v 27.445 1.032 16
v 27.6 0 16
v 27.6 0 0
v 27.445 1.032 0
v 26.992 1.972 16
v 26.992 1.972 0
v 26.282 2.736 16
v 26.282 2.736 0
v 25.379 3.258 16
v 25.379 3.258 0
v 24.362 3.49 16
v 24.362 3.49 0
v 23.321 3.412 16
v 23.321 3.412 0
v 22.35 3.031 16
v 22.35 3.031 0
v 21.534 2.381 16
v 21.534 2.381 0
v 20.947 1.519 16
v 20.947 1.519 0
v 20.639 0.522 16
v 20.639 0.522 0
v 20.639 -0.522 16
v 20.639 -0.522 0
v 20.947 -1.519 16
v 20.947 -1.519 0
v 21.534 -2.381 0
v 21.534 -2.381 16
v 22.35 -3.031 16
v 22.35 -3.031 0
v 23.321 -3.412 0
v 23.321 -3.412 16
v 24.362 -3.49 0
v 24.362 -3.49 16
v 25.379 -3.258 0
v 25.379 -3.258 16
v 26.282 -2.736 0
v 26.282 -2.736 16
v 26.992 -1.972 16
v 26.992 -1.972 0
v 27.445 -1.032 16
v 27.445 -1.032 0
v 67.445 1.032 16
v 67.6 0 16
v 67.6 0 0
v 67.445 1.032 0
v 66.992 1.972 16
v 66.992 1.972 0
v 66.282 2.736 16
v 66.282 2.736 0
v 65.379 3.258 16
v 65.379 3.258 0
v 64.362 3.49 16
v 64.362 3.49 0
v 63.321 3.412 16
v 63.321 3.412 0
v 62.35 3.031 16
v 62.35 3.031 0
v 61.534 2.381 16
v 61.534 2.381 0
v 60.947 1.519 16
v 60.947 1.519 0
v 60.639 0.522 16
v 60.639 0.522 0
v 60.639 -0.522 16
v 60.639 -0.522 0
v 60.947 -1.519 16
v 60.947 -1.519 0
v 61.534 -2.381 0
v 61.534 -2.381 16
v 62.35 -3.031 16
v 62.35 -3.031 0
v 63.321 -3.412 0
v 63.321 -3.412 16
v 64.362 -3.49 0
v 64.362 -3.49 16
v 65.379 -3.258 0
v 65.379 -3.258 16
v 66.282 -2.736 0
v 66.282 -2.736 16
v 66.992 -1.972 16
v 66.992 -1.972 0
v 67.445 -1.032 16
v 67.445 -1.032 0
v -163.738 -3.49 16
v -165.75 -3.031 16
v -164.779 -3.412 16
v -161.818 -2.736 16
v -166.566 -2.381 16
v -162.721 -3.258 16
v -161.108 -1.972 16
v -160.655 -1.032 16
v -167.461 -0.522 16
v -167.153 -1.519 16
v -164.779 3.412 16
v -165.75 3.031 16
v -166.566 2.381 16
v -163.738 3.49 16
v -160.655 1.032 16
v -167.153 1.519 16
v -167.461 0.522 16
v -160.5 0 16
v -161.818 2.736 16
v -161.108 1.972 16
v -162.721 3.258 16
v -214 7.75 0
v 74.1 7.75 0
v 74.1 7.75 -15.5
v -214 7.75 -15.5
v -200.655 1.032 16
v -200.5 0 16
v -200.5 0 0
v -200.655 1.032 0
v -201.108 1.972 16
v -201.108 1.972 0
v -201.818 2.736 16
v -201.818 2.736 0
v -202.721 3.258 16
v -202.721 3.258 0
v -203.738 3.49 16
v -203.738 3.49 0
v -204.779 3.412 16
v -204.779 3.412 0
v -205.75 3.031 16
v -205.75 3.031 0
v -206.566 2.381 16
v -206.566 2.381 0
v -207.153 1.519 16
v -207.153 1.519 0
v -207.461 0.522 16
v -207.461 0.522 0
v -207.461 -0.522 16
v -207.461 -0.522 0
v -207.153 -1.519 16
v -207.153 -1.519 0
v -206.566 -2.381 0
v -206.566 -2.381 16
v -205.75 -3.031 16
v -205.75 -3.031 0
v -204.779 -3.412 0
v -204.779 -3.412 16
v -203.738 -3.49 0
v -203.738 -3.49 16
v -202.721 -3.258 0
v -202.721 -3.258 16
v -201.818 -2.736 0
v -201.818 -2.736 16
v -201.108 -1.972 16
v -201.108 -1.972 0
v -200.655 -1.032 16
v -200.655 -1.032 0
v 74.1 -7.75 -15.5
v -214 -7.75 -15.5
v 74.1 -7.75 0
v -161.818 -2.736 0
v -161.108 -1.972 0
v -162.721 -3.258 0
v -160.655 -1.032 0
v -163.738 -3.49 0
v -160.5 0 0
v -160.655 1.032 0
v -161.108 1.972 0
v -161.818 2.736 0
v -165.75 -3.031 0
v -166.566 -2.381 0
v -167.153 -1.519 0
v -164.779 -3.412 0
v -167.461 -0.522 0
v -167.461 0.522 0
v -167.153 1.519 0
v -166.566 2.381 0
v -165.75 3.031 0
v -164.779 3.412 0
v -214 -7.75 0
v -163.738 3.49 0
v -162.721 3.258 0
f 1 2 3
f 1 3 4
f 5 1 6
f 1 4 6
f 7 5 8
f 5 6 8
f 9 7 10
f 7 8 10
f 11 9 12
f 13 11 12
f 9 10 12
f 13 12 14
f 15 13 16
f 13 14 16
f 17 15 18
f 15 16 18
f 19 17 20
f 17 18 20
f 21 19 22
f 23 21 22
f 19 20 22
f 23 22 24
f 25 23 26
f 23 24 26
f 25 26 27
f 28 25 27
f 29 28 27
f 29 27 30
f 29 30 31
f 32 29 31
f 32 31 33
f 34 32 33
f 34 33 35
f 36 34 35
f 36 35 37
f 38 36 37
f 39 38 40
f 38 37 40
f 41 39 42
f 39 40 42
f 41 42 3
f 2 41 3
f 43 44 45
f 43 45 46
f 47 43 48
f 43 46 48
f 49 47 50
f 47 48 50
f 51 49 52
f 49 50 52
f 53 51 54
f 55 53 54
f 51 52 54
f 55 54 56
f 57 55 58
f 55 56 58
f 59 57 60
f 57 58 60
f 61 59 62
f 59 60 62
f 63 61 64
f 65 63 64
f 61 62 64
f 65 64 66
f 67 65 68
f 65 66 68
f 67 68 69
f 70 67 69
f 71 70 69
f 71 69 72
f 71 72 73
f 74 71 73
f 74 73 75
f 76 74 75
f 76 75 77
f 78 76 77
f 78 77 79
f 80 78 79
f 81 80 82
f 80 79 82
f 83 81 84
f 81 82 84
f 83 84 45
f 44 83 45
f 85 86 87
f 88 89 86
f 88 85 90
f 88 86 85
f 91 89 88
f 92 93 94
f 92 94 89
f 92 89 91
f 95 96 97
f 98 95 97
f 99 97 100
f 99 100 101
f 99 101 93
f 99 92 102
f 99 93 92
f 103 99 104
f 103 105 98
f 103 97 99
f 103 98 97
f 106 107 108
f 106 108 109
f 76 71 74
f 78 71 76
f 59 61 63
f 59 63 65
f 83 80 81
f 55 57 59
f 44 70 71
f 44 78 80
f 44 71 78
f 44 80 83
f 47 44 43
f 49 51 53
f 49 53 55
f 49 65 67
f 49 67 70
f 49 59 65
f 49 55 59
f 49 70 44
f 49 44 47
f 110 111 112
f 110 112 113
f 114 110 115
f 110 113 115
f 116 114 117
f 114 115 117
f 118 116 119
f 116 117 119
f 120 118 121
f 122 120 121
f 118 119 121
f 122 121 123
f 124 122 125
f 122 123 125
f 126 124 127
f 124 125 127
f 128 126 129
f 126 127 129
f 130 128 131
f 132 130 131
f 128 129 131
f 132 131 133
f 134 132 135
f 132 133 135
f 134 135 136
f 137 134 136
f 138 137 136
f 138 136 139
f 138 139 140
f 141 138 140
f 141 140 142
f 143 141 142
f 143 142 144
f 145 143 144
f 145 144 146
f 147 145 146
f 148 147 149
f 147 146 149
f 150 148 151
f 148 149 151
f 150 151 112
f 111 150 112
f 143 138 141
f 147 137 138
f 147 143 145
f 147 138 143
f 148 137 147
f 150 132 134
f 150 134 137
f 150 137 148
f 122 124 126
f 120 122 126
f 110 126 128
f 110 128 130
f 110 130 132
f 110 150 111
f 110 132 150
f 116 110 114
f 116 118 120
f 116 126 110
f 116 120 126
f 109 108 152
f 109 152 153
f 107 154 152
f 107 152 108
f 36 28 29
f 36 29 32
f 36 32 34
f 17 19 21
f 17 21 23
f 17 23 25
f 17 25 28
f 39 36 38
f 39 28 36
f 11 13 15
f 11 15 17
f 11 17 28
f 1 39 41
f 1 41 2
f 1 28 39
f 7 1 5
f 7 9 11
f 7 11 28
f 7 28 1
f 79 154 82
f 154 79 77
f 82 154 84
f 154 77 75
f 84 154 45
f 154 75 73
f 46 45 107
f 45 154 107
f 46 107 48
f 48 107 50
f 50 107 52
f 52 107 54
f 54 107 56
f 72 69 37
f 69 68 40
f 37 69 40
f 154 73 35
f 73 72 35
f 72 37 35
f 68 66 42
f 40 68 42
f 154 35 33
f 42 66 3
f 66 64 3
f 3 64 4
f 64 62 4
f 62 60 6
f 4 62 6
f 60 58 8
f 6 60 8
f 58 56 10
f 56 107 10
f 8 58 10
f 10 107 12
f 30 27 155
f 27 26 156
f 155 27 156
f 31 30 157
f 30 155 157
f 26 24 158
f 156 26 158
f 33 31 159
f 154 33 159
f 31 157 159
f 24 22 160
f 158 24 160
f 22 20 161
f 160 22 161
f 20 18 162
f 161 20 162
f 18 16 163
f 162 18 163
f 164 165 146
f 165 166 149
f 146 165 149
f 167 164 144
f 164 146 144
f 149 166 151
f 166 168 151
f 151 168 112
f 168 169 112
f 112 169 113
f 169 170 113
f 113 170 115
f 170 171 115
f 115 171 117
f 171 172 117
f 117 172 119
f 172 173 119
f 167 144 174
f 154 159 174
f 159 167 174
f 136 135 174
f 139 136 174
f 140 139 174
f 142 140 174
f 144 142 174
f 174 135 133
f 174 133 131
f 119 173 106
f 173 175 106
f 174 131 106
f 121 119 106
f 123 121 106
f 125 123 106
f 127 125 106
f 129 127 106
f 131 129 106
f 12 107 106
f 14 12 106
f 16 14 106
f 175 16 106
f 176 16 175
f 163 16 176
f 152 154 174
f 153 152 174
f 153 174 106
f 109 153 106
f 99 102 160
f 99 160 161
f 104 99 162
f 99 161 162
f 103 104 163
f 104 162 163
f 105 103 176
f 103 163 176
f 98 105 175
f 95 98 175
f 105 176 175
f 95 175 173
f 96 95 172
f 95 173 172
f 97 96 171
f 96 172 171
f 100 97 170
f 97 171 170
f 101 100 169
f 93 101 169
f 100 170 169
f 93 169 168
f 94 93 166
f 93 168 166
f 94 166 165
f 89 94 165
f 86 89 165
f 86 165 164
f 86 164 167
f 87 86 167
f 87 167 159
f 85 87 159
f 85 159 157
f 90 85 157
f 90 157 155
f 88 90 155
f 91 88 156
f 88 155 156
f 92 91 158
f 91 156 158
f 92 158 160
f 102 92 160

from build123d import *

# Parameters (mm, degrees)
SKETCH_2_R        = 3.5
EXTRUDE_1_DEPTH   = 16
EXTRUDE_1_2_DEPTH = 16
EXTRUDE_1_3_DEPTH = 16
EXTRUDE_1_4_DEPTH = 16
SKETCH_3_W        = 288.1
SKETCH_3_H        = 15.5
EXTRUDE_2_DEPTH   = 15.5


with BuildPart() as part:
    # 草图2 → 凸台-拉伸1 (new body)
    with BuildSketch(Plane.XY):
        with Locations((-164, 0)):
            Circle(SKETCH_2_R)
    extrude(amount=EXTRUDE_1_DEPTH)



with BuildPart() as body_2:
    # 草图2 → Extrude 1 2 (new body)
    with BuildSketch(Plane.XY):
        with Locations((24.1, 0)):
            Circle(SKETCH_2_R)
    extrude(amount=EXTRUDE_1_2_DEPTH)


with BuildPart() as body_3:
    # 草图2 → Extrude 1 3 (new body)
    with BuildSketch(Plane.XY):
        with Locations((-204, 0)):
            Circle(SKETCH_2_R)
    extrude(amount=EXTRUDE_1_3_DEPTH)


with BuildPart() as body_4:
    # 草图2 → Extrude 1 4 (new body)
    with BuildSketch(Plane.XY):
        with Locations((64.1, 0)):
            Circle(SKETCH_2_R)
    extrude(amount=EXTRUDE_1_4_DEPTH)


with BuildPart() as part_1:
    add(part.part)

    add(body_2.part)  # 凸台-拉伸2 merges body 2

    add(body_3.part)  # 凸台-拉伸2 merges body 3

    add(body_4.part)  # 凸台-拉伸2 merges body 4
    # 草图3 → 凸台-拉伸2 (add)
    with BuildSketch(Plane(origin=(0, 0, 0), x_dir=(-1, 0, 0), z_dir=(0, 0, -1))):
        with Locations((69.95, 0)):
            Rectangle(SKETCH_3_W, SKETCH_3_H)
    extrude(amount=EXTRUDE_2_DEPTH)


solid = part_1.part
